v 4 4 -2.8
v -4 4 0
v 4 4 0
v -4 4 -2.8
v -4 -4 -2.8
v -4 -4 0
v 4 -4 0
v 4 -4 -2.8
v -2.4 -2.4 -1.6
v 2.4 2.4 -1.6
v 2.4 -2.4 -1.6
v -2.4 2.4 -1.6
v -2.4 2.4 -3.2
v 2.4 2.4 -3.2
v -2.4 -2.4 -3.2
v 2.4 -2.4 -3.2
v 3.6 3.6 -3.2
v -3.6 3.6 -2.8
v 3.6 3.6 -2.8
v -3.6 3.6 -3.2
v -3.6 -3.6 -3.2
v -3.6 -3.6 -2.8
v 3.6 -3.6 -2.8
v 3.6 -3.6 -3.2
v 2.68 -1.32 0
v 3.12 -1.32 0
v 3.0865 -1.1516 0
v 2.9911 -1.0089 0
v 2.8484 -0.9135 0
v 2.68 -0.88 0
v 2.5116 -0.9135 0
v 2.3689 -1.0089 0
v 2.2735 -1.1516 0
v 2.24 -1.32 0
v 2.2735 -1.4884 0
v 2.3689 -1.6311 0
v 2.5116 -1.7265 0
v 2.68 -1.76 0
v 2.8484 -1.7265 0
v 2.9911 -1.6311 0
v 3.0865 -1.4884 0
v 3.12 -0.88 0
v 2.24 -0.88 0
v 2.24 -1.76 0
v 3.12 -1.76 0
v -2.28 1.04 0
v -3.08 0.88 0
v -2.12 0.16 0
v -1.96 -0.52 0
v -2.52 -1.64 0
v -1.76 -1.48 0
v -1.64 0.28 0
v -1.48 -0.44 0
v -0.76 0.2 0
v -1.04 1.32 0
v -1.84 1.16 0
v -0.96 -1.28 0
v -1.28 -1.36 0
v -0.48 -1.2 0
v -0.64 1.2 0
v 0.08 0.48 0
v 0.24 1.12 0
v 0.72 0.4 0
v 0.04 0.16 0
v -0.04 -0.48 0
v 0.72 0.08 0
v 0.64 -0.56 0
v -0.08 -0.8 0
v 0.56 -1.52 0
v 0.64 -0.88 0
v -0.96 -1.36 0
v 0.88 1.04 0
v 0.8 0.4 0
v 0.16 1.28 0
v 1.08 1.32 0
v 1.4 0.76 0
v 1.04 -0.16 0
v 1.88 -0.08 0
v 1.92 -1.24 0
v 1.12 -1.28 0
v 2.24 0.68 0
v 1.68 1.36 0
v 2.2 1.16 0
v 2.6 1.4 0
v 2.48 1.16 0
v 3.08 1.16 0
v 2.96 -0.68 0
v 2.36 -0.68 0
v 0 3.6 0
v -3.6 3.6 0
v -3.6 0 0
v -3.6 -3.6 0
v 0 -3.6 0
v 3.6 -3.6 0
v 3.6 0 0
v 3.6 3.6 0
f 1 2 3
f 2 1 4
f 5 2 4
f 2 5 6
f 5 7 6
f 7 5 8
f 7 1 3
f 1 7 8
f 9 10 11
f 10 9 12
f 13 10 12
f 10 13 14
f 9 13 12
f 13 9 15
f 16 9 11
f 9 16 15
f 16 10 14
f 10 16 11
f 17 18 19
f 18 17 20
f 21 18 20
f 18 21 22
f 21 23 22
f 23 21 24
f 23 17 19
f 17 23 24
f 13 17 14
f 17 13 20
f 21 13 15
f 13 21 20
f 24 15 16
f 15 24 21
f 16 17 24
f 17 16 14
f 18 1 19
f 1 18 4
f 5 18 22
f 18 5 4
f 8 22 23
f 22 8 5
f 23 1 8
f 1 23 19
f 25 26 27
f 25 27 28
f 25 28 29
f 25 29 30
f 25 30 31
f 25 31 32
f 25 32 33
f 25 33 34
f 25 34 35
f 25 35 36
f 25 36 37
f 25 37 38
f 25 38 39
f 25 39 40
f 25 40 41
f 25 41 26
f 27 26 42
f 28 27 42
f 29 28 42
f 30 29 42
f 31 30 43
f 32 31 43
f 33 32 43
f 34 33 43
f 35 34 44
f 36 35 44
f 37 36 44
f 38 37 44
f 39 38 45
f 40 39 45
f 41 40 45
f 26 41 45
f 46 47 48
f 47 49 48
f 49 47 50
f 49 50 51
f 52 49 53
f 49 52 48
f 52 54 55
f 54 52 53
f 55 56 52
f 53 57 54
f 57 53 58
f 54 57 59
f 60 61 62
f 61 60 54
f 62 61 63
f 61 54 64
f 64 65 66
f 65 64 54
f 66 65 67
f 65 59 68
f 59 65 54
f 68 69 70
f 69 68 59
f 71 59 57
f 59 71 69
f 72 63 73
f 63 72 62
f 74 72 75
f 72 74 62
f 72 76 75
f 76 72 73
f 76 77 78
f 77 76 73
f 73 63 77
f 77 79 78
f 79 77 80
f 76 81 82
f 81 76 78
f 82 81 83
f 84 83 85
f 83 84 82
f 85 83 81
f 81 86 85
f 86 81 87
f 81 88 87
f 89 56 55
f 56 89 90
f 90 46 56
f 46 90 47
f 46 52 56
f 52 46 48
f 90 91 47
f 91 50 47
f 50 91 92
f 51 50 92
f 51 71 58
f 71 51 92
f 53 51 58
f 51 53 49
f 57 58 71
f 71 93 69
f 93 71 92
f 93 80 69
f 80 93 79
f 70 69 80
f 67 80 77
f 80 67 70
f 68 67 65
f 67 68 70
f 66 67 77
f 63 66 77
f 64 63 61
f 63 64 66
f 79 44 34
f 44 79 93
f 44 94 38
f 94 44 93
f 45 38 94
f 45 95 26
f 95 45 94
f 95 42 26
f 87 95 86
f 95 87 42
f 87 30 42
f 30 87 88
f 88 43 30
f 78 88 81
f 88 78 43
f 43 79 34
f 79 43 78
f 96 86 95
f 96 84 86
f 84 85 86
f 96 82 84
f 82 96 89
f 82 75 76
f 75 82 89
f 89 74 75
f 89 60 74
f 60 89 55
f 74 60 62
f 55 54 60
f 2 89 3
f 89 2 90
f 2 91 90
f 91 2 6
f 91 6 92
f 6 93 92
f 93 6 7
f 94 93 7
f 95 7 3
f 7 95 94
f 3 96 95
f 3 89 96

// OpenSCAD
// file: ../p/box5.scad
use <../lib.scad>
function ldraw_lib__box5() = [
// 0 Box with 5 Faces and All Edges
// 0 Name: box5.dat
// 0 Author: James Jessiman
// 0 !LDRAW_ORG Primitive UPDATE 2012-01
// 0 !LICENSE Licensed under CC BY 2.0 and CC BY 4.0 : see CAreadme.txt
// 
// 0 BFC CERTIFY CCW
  [0,"BFC","CERTIFY"],
  [0,"BFC","CCW"],
// 
// 0 !HISTORY 2002-04-03 [sbliss] Modified for BFC compliance
// 0 !HISTORY 2002-04-25 [PTadmin] Official Update 2002-02
// 0 !HISTORY 2007-06-24 [PTadmin] Header formatted for Contributor Agreement
// 0 !HISTORY 2008-07-01 [PTadmin] Official Update 2008-01
// 0 !HISTORY 2012-02-16 [Philo] Changed to CCW
// 0 !HISTORY 2012-03-30 [PTadmin] Official Update 2012-01
// 
// 
// 2 24 1 1 1 -1 1 1
  [2,24,1,1,1,-1,1,1],
// 2 24 -1 1 1 -1 1 -1
  [2,24,-1,1,1,-1,1,-1],
// 2 24 -1 1 -1 1 1 -1
  [2,24,-1,1,-1,1,1,-1],
// 2 24 1 1 -1 1 1 1
  [2,24,1,1,-1,1,1,1],
// 2 24 1 0 1 -1 0 1
  [2,24,1,0,1,-1,0,1],
// 2 24 -1 0 1 -1 0 -1
  [2,24,-1,0,1,-1,0,-1],
// 2 24 -1 0 -1 1 0 -1
  [2,24,-1,0,-1,1,0,-1],
// 2 24 1 0 -1 1 0 1
  [2,24,1,0,-1,1,0,1],
// 2 24 1 0 1 1 1 1
  [2,24,1,0,1,1,1,1],
// 2 24 -1 0 1 -1 1 1
  [2,24,-1,0,1,-1,1,1],
// 2 24 1 0 -1 1 1 -1
  [2,24,1,0,-1,1,1,-1],
// 2 24 -1 0 -1 -1 1 -1
  [2,24,-1,0,-1,-1,1,-1],
// 4 16 -1 1 1 1 1 1 1 1 -1 -1 1 -1
  [4,16,-1,1,1,1,1,1,1,1,-1,-1,1,-1],
// 4 16 -1 1 1 -1 0 1 1 0 1 1 1 1
  [4,16,-1,1,1,-1,0,1,1,0,1,1,1,1],
// 4 16 -1 1 -1 -1 0 -1 -1 0 1 -1 1 1
  [4,16,-1,1,-1,-1,0,-1,-1,0,1,-1,1,1],
// 4 16 1 1 -1 1 0 -1 -1 0 -1 -1 1 -1
  [4,16,1,1,-1,1,0,-1,-1,0,-1,-1,1,-1],
// 4 16 1 1 1 1 0 1 1 0 -1 1 1 -1
  [4,16,1,1,1,1,0,1,1,0,-1,1,1,-1],
];
module ldraw_lib__box5(step=0, col=false, unit=2/5, alt=false, line=0.2, solid=!$preview)
    makepoly(ldraw_lib__box5(), step=step, col=col, unit=unit, alt=alt, line=line, solid=solid);
ldraw_lib__box5(line=0.2);
// file: ../p/box4.scad
use <../lib.scad>
function ldraw_lib__box4() = [
// 0 Box with 4 Faces (2 Parallel Pairs) and All Edges
// 0 Name: box4.dat
// 0 Author: James Jessiman
// 0 !LDRAW_ORG Primitive UPDATE 2012-01
// 0 !LICENSE Licensed under CC BY 2.0 and CC BY 4.0 : see CAreadme.txt
// 
// 0 BFC CERTIFY CCW
  [0,"BFC","CERTIFY"],
  [0,"BFC","CCW"],
// 
// 0 !HISTORY 2002-04-03 [sbliss] Modified for BFC compliance
// 0 !HISTORY 2002-04-25 [PTadmin] Official Update 2002-02
// 0 !HISTORY 2007-06-24 [PTadmin] Header formatted for Contributor Agreement
// 0 !HISTORY 2008-07-01 [PTadmin] Official Update 2008-01
// 0 !HISTORY 2012-02-16 [Philo] Changed to CCW
// 0 !HISTORY 2012-03-30 [PTadmin] Official Update 2012-01
// 
// 
// 2 24 1 1 1 -1 1 1
  [2,24,1,1,1,-1,1,1],
// 2 24 -1 1 1 -1 1 -1
  [2,24,-1,1,1,-1,1,-1],
// 2 24 -1 1 -1 1 1 -1
  [2,24,-1,1,-1,1,1,-1],
// 2 24 1 1 -1 1 1 1
  [2,24,1,1,-1,1,1,1],
// 2 24 1 0 1 -1 0 1
  [2,24,1,0,1,-1,0,1],
// 2 24 -1 0 1 -1 0 -1
  [2,24,-1,0,1,-1,0,-1],
// 2 24 -1 0 -1 1 0 -1
  [2,24,-1,0,-1,1,0,-1],
// 2 24 1 0 -1 1 0 1
  [2,24,1,0,-1,1,0,1],
// 2 24 1 0 1 1 1 1
  [2,24,1,0,1,1,1,1],
// 2 24 -1 0 1 -1 1 1
  [2,24,-1,0,1,-1,1,1],
// 2 24 1 0 -1 1 1 -1
  [2,24,1,0,-1,1,1,-1],
// 2 24 -1 0 -1 -1 1 -1
  [2,24,-1,0,-1,-1,1,-1],
// 4 16 -1 1 1 -1 0 1 1 0 1 1 1 1
  [4,16,-1,1,1,-1,0,1,1,0,1,1,1,1],
// 4 16 -1 1 -1 -1 0 -1 -1 0 1 -1 1 1
  [4,16,-1,1,-1,-1,0,-1,-1,0,1,-1,1,1],
// 4 16 1 1 -1 1 0 -1 -1 0 -1 -1 1 -1
  [4,16,1,1,-1,1,0,-1,-1,0,-1,-1,1,-1],
// 4 16 1 1 1 1 0 1 1 0 -1 1 1 -1
  [4,16,1,1,1,1,0,1,1,0,-1,1,1,-1],
];
module ldraw_lib__box4(step=0, col=false, unit=2/5, alt=false, line=0.2, solid=!$preview)
    makepoly(ldraw_lib__box4(), step=step, col=col, unit=unit, alt=alt, line=line, solid=solid);
ldraw_lib__box4(line=0.2);
// file: s/3070bs01.scad
use <../../lib.scad>
use <../../p/box4.scad>
use <../../p/box5.scad>
function ldraw_lib__s__3070bs01() = [
// 0 ~Tile  1 x  1 with Groove without Top Face
// 0 Name: s\3070bs01.dat
// 0 Author: Chris Dee [cwdee]
// 0 !LDRAW_ORG Subpart UPDATE 2009-02
// 0 !LICENSE Licensed under CC BY 2.0 and CC BY 4.0 : see CAreadme.txt
// 
// 0 BFC CERTIFY CCW
  [0,"BFC","CERTIFY"],
  [0,"BFC","CCW"],
// 
// 0 !HISTORY 2009-09-03 [PTadmin] Official Update 2009-02
// 
// 
// 1 16 0 0 0 10 0 0 0 7 0 0 0 10 box4.dat
  [1,16,0,0,0,10,0,0,0,7,0,0,0,10, ldraw_lib__box4()],
// 0 BFC INVERTNEXT
  [0,"BFC","INVERTNEXT"],
// 1 16 0 8 0 6 0 0 0 -4 0 0 0 6 box5.dat
  [1,16,0,8,0,6,0,0,0,-4,0,0,0,6, ldraw_lib__box5()],
// 1 16 0 7 0 9 0 0 0 1 0 0 0 9 box4.dat
  [1,16,0,7,0,9,0,0,0,1,0,0,0,9, ldraw_lib__box4()],
// 
// 4 16 9 8 9 6 8 6 -6 8 6 -9 8 9
  [4,16,9,8,9,6,8,6,-6,8,6,-9,8,9],
// 4 16 -9 8 9 -6 8 6 -6 8 -6 -9 8 -9
  [4,16,-9,8,9,-6,8,6,-6,8,-6,-9,8,-9],
// 4 16 -9 8 -9 -6 8 -6 6 8 -6 9 8 -9
  [4,16,-9,8,-9,-6,8,-6,6,8,-6,9,8,-9],
// 4 16 9 8 -9 6 8 -6 6 8 6 9 8 9
  [4,16,9,8,-9,6,8,-6,6,8,6,9,8,9],
// 
// 4 16 10 7 10 9 7 9 -9 7 9 -10 7 10
  [4,16,10,7,10,9,7,9,-9,7,9,-10,7,10],
// 4 16 -10 7 10 -9 7 9 -9 7 -9 -10 7 -10
  [4,16,-10,7,10,-9,7,9,-9,7,-9,-10,7,-10],
// 4 16 -10 7 -10 -9 7 -9 9 7 -9 10 7 -10
  [4,16,-10,7,-10,-9,7,-9,9,7,-9,10,7,-10],
// 4 16 10 7 -10 9 7 -9 9 7 9 10 7 10
  [4,16,10,7,-10,9,7,-9,9,7,9,10,7,10],
// 0
];
module ldraw_lib__s__3070bs01(step=0, col=false, unit=2/5, alt=false, line=0.2, solid=!$preview)
    makepoly(ldraw_lib__s__3070bs01(), step=step, col=col, unit=unit, alt=alt, line=line, solid=solid);
ldraw_lib__s__3070bs01(line=0.2);
// file: ../p/4-4ndis.scad
use <../lib.scad>
function ldraw_lib__4_4ndis() = [
// 0 Disc Negative 1.0
// 0 Name: 4-4ndis.dat
// 0 Author: James Jessiman
// 0 !LDRAW_ORG Primitive UPDATE 2012-01
// 0 !LICENSE Licensed under CC BY 2.0 and CC BY 4.0 : see CAreadme.txt
// 
// 0 BFC CERTIFY CCW
  [0,"BFC","CERTIFY"],
  [0,"BFC","CCW"],
// 
// 0 !HISTORY 2002-03-23 [sbliss] Added BFC statement; compacted code
// 0 !HISTORY 2002-04-25 [PTadmin] Official Update 2002-02
// 0 !HISTORY 2007-06-24 [PTadmin] Header formatted for Contributor Agreement
// 0 !HISTORY 2008-07-01 [PTadmin] Official Update 2008-01
// 0 !HISTORY 2012-02-16 [Philo] Changed to CCW
// 0 !HISTORY 2012-03-30 [PTadmin] Official Update 2012-01
// 
// 
// 3 16 0.9239 0 0.3827 1 0 0 1 0 1
  [3,16,0.9239,0,0.3827,1,0,0,1,0,1],
// 3 16 0.7071 0 0.7071 0.9239 0 0.3827 1 0 1
  [3,16,0.7071,0,0.7071,0.9239,0,0.3827,1,0,1],
// 3 16 0.3827 0 0.9239 0.7071 0 0.7071 1 0 1
  [3,16,0.3827,0,0.9239,0.7071,0,0.7071,1,0,1],
// 3 16 0 0 1 0.3827 0 0.9239 1 0 1
  [3,16,0,0,1,0.3827,0,0.9239,1,0,1],
// 3 16 -0.3827 0 0.9239 0 0 1 -1 0 1
  [3,16,-0.3827,0,0.9239,0,0,1,-1,0,1],
// 3 16 -0.7071 0 0.7071 -0.3827 0 0.9239 -1 0 1
  [3,16,-0.7071,0,0.7071,-0.3827,0,0.9239,-1,0,1],
// 3 16 -0.9239 0 0.3827 -0.7071 0 0.7071 -1 0 1
  [3,16,-0.9239,0,0.3827,-0.7071,0,0.7071,-1,0,1],
// 3 16 -1 0 0 -0.9239 0 0.3827 -1 0 1
  [3,16,-1,0,0,-0.9239,0,0.3827,-1,0,1],
// 3 16 -0.9239 0 -0.3827 -1 0 0 -1 0 -1
  [3,16,-0.9239,0,-0.3827,-1,0,0,-1,0,-1],
// 3 16 -0.7071 0 -0.7071 -0.9239 0 -0.3827 -1 0 -1
  [3,16,-0.7071,0,-0.7071,-0.9239,0,-0.3827,-1,0,-1],
// 3 16 -0.3827 0 -0.9239 -0.7071 0 -0.7071 -1 0 -1
  [3,16,-0.3827,0,-0.9239,-0.7071,0,-0.7071,-1,0,-1],
// 3 16 0 0 -1 -0.3827 0 -0.9239 -1 0 -1
  [3,16,0,0,-1,-0.3827,0,-0.9239,-1,0,-1],
// 3 16 0.3827 0 -0.9239 0 0 -1 1 0 -1
  [3,16,0.3827,0,-0.9239,0,0,-1,1,0,-1],
// 3 16 0.7071 0 -0.7071 0.3827 0 -0.9239 1 0 -1
  [3,16,0.7071,0,-0.7071,0.3827,0,-0.9239,1,0,-1],
// 3 16 0.9239 0 -0.3827 0.7071 0 -0.7071 1 0 -1
  [3,16,0.9239,0,-0.3827,0.7071,0,-0.7071,1,0,-1],
// 3 16 1 0 0 0.9239 0 -0.3827 1 0 -1
  [3,16,1,0,0,0.9239,0,-0.3827,1,0,-1],
];
module ldraw_lib__4_4ndis(step=0, col=false, unit=2/5, alt=false, line=0.2, solid=!$preview)
    makepoly(ldraw_lib__4_4ndis(), step=step, col=col, unit=unit, alt=alt, line=line, solid=solid);
ldraw_lib__4_4ndis(line=0.2);
// file: ../p/4-4disc.scad
use <../lib.scad>
function ldraw_lib__4_4disc() = [
// 0 Disc 1.0
// 0 Name: 4-4disc.dat
// 0 Author: James Jessiman
// 0 !LDRAW_ORG Primitive UPDATE 2002-02
// 0 !LICENSE Licensed under CC BY 2.0 and CC BY 4.0 : see CAreadme.txt
// 
// 0 BFC CERTIFY CCW
  [0,"BFC","CERTIFY"],
  [0,"BFC","CCW"],
// 
// 0 !HISTORY 1998-12-15 [PTadmin] Official Update 1998-10
// 0 !HISTORY 2002-03-23 [sbliss] Added BFC statement
// 0 !HISTORY 2002-04-25 [PTadmin] Official Update 2002-02
// 0 !HISTORY 2007-06-24 [PTadmin] Header formatted for Contributor Agreement
// 0 !HISTORY 2008-07-01 [PTadmin] Official Update 2008-01
// 
// 
// 3 16 0 0 0 1 0 0 0.9239 0 0.3827
  [3,16,0,0,0,1,0,0,0.9239,0,0.3827],
// 3 16 0 0 0 0.9239 0 0.3827 0.7071 0 0.7071
  [3,16,0,0,0,0.9239,0,0.3827,0.7071,0,0.7071],
// 3 16 0 0 0 0.7071 0 0.7071 0.3827 0 0.9239
  [3,16,0,0,0,0.7071,0,0.7071,0.3827,0,0.9239],
// 3 16 0 0 0 0.3827 0 0.9239 0 0 1
  [3,16,0,0,0,0.3827,0,0.9239,0,0,1],
// 3 16 0 0 0 0 0 1 -0.3827 0 0.9239
  [3,16,0,0,0,0,0,1,-0.3827,0,0.9239],
// 3 16 0 0 0 -0.3827 0 0.9239 -0.7071 0 0.7071
  [3,16,0,0,0,-0.3827,0,0.9239,-0.7071,0,0.7071],
// 3 16 0 0 0 -0.7071 0 0.7071 -0.9239 0 0.3827
  [3,16,0,0,0,-0.7071,0,0.7071,-0.9239,0,0.3827],
// 3 16 0 0 0 -0.9239 0 0.3827 -1 0 -0
  [3,16,0,0,0,-0.9239,0,0.3827,-1,0,-0],
// 3 16 0 0 0 -1 0 -0 -0.9239 0 -0.3827
  [3,16,0,0,0,-1,0,-0,-0.9239,0,-0.3827],
// 3 16 0 0 0 -0.9239 0 -0.3827 -0.7071 0 -0.7071
  [3,16,0,0,0,-0.9239,0,-0.3827,-0.7071,0,-0.7071],
// 3 16 0 0 0 -0.7071 0 -0.7071 -0.3827 0 -0.9239
  [3,16,0,0,0,-0.7071,0,-0.7071,-0.3827,0,-0.9239],
// 3 16 0 0 0 -0.3827 0 -0.9239 0 0 -1
  [3,16,0,0,0,-0.3827,0,-0.9239,0,0,-1],
// 3 16 0 0 0 0 0 -1 0.3827 0 -0.9239
  [3,16,0,0,0,0,0,-1,0.3827,0,-0.9239],
// 3 16 0 0 0 0.3827 0 -0.9239 0.7071 0 -0.7071
  [3,16,0,0,0,0.3827,0,-0.9239,0.7071,0,-0.7071],
// 3 16 0 0 0 0.7071 0 -0.7071 0.9239 0 -0.3827
  [3,16,0,0,0,0.7071,0,-0.7071,0.9239,0,-0.3827],
// 3 16 0 0 0 0.9239 0 -0.3827 1 0 0
  [3,16,0,0,0,0.9239,0,-0.3827,1,0,0],
// 0
];
module ldraw_lib__4_4disc(step=0, col=false, unit=2/5, alt=false, line=0.2, solid=!$preview)
    makepoly(ldraw_lib__4_4disc(), step=step, col=col, unit=unit, alt=alt, line=line, solid=solid);
ldraw_lib__4_4disc(line=0.2);
// main file
use <../lib.scad>
use <../p/4-4disc.scad>
use <../p/4-4ndis.scad>
use <s/3070bs01.scad>
function ldraw_lib__3070bp15() = [
// 0 Tile  1 x  1 with Bright Pink and Yellow "HEY!" on Blue Background Pattern
// 0 Name: 3070bp15.dat
// 0 Author: Takeshi Takahashi [RainbowDolphin]
// 0 !LDRAW_ORG Part UPDATE 2022-01
// 0 !LICENSE Licensed under CC BY 2.0 and CC BY 4.0 : see CAreadme.txt
// 
// 0 BFC CERTIFY CCW
  [0,"BFC","CERTIFY"],
  [0,"BFC","CCW"],
// 
// 0 !KEYWORDS Bricklink 3070bpb154, Dots, Set 41916
// 
// 0 !HISTORY 2022-01-14 [PTadmin] Official Update 2022-01
// 
// 
// 1 16 0 0 0 1 0 0 0 1 0 0 0 1 s\3070bs01.dat
  [1,16,0,0,0,1,0,0,0,1,0,0,0,1, ldraw_lib__s__3070bs01()],
// 1 29 6.7 0 -3.3 1.1 0 0 0 1 0 0 0 1.1 4-4disc.dat
  [1,29,6.7,0,-3.3,1.1,0,0,0,1,0,0,0,1.1, ldraw_lib__4_4disc()],
// 1 1 6.7 0 -3.3 1.1 0 0 0 1 0 0 0 1.1 4-4ndis.dat
  [1,1,6.7,0,-3.3,1.1,0,0,0,1,0,0,0,1.1, ldraw_lib__4_4ndis()],
// 3 14 -5.7 0 2.6 -7.7 0 2.2 -5.3 0 0.4
  [3,14,-5.7,0,2.6,-7.7,0,2.2,-5.3,0,0.4],
// 4 14 -4.9 0 -1.3 -5.3 0 0.4 -7.7 0 2.2 -6.3 0 -4.1
  [4,14,-4.9,0,-1.3,-5.3,0,0.4,-7.7,0,2.2,-6.3,0,-4.1],
// 3 14 -4.9 0 -1.3 -6.3 0 -4.1 -4.4 0 -3.7
  [3,14,-4.9,0,-1.3,-6.3,0,-4.1,-4.4,0,-3.7],
// 4 14 -4.1 0 0.7 -5.3 0 0.4 -4.9 0 -1.3 -3.7 0 -1.1
  [4,14,-4.1,0,0.7,-5.3,0,0.4,-4.9,0,-1.3,-3.7,0,-1.1],
// 4 14 -4.1 0 0.7 -3.7 0 -1.1 -1.9 0 0.5 -2.6 0 3.3
  [4,14,-4.1,0,0.7,-3.7,0,-1.1,-1.9,0,0.5,-2.6,0,3.3],
// 3 14 -2.6 0 3.3 -4.6 0 2.9 -4.1 0 0.7
  [3,14,-2.6,0,3.3,-4.6,0,2.9,-4.1,0,0.7],
// 4 14 -2.4 0 -3.2 -1.9 0 0.5 -3.7 0 -1.1 -3.2 0 -3.4
  [4,14,-2.4,0,-3.2,-1.9,0,0.5,-3.7,0,-1.1,-3.2,0,-3.4],
// 3 353 -1.9 0 0.5 -2.4 0 -3.2 -1.2 0 -3
  [3,353,-1.9,0,0.5,-2.4,0,-3.2,-1.2,0,-3],
// 4 29 -1.6 0 3 -1.9 0 0.5 0.2 0 1.2 0.6 0 2.8
  [4,29,-1.6,0,3,-1.9,0,0.5,0.2,0,1.2,0.6,0,2.8],
// 3 29 0.6 0 2.8 0.2 0 1.2 1.8 0 1
  [3,29,0.6,0,2.8,0.2,0,1.2,1.8,0,1],
// 3 29 0.2 0 1.2 -1.9 0 0.5 0.1 0 0.4
  [3,29,0.2,0,1.2,-1.9,0,0.5,0.1,0,0.4],
// 4 29 0.1 0 0.4 -1.9 0 0.5 -0.1 0 -1.2 1.8 0 0.2
  [4,29,0.1,0,0.4,-1.9,0,0.5,-0.1,0,-1.2,1.8,0,0.2],
// 3 29 1.8 0 0.2 -0.1 0 -1.2 1.6 0 -1.4
  [3,29,1.8,0,0.2,-0.1,0,-1.2,1.6,0,-1.4],
// 4 29 -0.2 0 -2 -0.1 0 -1.2 -1.9 0 0.5 -1.2 0 -3
  [4,29,-0.2,0,-2,-0.1,0,-1.2,-1.9,0,0.5,-1.2,0,-3],
// 4 29 1.6 0 -2.2 -0.2 0 -2 -1.2 0 -3 1.4 0 -3.8
  [4,29,1.6,0,-2.2,-0.2,0,-2,-1.2,0,-3,1.4,0,-3.8],
// 4 29 1.4 0 -3.8 -1.2 0 -3 -2.4 0 -3.2 -2.4 0 -3.4
  [4,29,1.4,0,-3.8,-1.2,0,-3,-2.4,0,-3.2,-2.4,0,-3.4],
// 4 353 2.2 0 2.6 0.6 0 2.8 1.8 0 1 2 0 1
  [4,353,2.2,0,2.6,0.6,0,2.8,1.8,0,1,2,0,1],
// 4 14 0.4 0 3.2 0.6 0 2.8 2.2 0 2.6 2.7 0 3.3
  [4,14,0.4,0,3.2,0.6,0,2.8,2.2,0,2.6,2.7,0,3.3],
// 4 14 3.5 0 1.9 2.7 0 3.3 2.2 0 2.6 2 0 1
  [4,14,3.5,0,1.9,2.7,0,3.3,2.2,0,2.6,2,0,1],
// 4 14 4.7 0 -0.2 3.5 0 1.9 2 0 1 2.6 0 -0.4
  [4,14,4.7,0,-0.2,3.5,0,1.9,2,0,1,2.6,0,-0.4],
// 3 14 2 0 1 1.8 0 1 2.6 0 -0.4
  [3,14,2,0,1,1.8,0,1,2.6,0,-0.4],
// 4 14 4.7 0 -0.2 2.6 0 -0.4 2.8 0 -3.2 4.8 0 -3.1
  [4,14,4.7,0,-0.2,2.6,0,-0.4,2.8,0,-3.2,4.8,0,-3.1],
// 4 14 3.5 0 1.9 4.7 0 -0.2 5.6 0 1.7 4.2 0 3.4
  [4,14,3.5,0,1.9,4.7,0,-0.2,5.6,0,1.7,4.2,0,3.4],
// 3 14 4.2 0 3.4 5.6 0 1.7 5.5 0 2.9
  [3,14,4.2,0,3.4,5.6,0,1.7,5.5,0,2.9],
// 4 14 6.5 0 3.5 4.2 0 3.4 5.5 0 2.9 6.2 0 2.9
  [4,14,6.5,0,3.5,4.2,0,3.4,5.5,0,2.9,6.2,0,2.9],
// 3 353 6.2 0 2.9 5.5 0 2.9 5.6 0 1.7
  [3,353,6.2,0,2.9,5.5,0,2.9,5.6,0,1.7],
// 4 29 7.7 0 2.9 6.2 0 2.9 5.6 0 1.7 7.4 0 -1.7
  [4,29,7.7,0,2.9,6.2,0,2.9,5.6,0,1.7,7.4,0,-1.7],
// 3 29 5.6 0 1.7 5.9 0 -1.7 7.4 0 -1.7
  [3,29,5.6,0,1.7,5.9,0,-1.7,7.4,0,-1.7],
// 4 1 -2.6 0 3.3 0 0 9 -9 0 9 -4.6 0 2.9
  [4,1,-2.6,0,3.3,0,0,9,-9,0,9,-4.6,0,2.9],
// 4 1 -5.7 0 2.6 -4.6 0 2.9 -9 0 9 -7.7 0 2.2
  [4,1,-5.7,0,2.6,-4.6,0,2.9,-9,0,9,-7.7,0,2.2],
// 4 1 -4.6 0 2.9 -5.7 0 2.6 -5.3 0 0.4 -4.1 0 0.7
  [4,1,-4.6,0,2.9,-5.7,0,2.6,-5.3,0,0.4,-4.1,0,0.7],
// 3 1 -9 0 9 -9 0 0 -7.7 0 2.2
  [3,1,-9,0,9,-9,0,0,-7.7,0,2.2],
// 4 1 -6.3 0 -4.1 -7.7 0 2.2 -9 0 0 -9 0 -9
  [4,1,-6.3,0,-4.1,-7.7,0,2.2,-9,0,0,-9,0,-9],
// 3 1 -4.4 0 -3.7 -6.3 0 -4.1 -9 0 -9
  [3,1,-4.4,0,-3.7,-6.3,0,-4.1,-9,0,-9],
// 4 1 -3.2 0 -3.4 -4.4 0 -3.7 -9 0 -9 -2.4 0 -3.4
  [4,1,-3.2,0,-3.4,-4.4,0,-3.7,-9,0,-9,-2.4,0,-3.4],
// 4 1 -4.9 0 -1.3 -4.4 0 -3.7 -3.2 0 -3.4 -3.7 0 -1.1
  [4,1,-4.9,0,-1.3,-4.4,0,-3.7,-3.2,0,-3.4,-3.7,0,-1.1],
// 3 1 -2.4 0 -3.2 -3.2 0 -3.4 -2.4 0 -3.4
  [3,1,-2.4,0,-3.2,-3.2,0,-3.4,-2.4,0,-3.4],
// 4 1 -2.4 0 -3.4 -9 0 -9 0 0 -9 1.4 0 -3.8
  [4,1,-2.4,0,-3.4,-9,0,-9,0,0,-9,1.4,0,-3.8],
// 4 1 2.8 0 -3.2 1.4 0 -3.8 0 0 -9 4.8 0 -3.1
  [4,1,2.8,0,-3.2,1.4,0,-3.8,0,0,-9,4.8,0,-3.1],
// 3 1 1.6 0 -2.2 1.4 0 -3.8 2.8 0 -3.2
  [3,1,1.6,0,-2.2,1.4,0,-3.8,2.8,0,-3.2],
// 4 1 1.6 0 -1.4 1.6 0 -2.2 2.8 0 -3.2 2.6 0 -0.4
  [4,1,1.6,0,-1.4,1.6,0,-2.2,2.8,0,-3.2,2.6,0,-0.4],
// 4 1 -0.2 0 -2 1.6 0 -2.2 1.6 0 -1.4 -0.1 0 -1.2
  [4,1,-0.2,0,-2,1.6,0,-2.2,1.6,0,-1.4,-0.1,0,-1.2],
// 3 1 1.8 0 0.2 1.6 0 -1.4 2.6 0 -0.4
  [3,1,1.8,0,0.2,1.6,0,-1.4,2.6,0,-0.4],
// 3 1 1.8 0 1 1.8 0 0.2 2.6 0 -0.4
  [3,1,1.8,0,1,1.8,0,0.2,2.6,0,-0.4],
// 4 1 0.1 0 0.4 1.8 0 0.2 1.8 0 1 0.2 0 1.2
  [4,1,0.1,0,0.4,1.8,0,0.2,1.8,0,1,0.2,0,1.2],
// 4 1 4.8 0 -3.1 0 0 -9 5.6 0 -4.4 5.6 0 -3.3
  [4,1,4.8,0,-3.1,0,0,-9,5.6,0,-4.4,5.6,0,-3.3],
// 4 1 5.6 0 -4.4 0 0 -9 9 0 -9 6.7 0 -4.4
  [4,1,5.6,0,-4.4,0,0,-9,9,0,-9,6.7,0,-4.4],
// 3 1 7.8 0 -4.4 6.7 0 -4.4 9 0 -9
  [3,1,7.8,0,-4.4,6.7,0,-4.4,9,0,-9],
// 4 1 7.8 0 -4.4 9 0 -9 9 0 0 7.8 0 -3.3
  [4,1,7.8,0,-4.4,9,0,-9,9,0,0,7.8,0,-3.3],
// 3 1 9 0 0 7.8 0 -2.2 7.8 0 -3.3
  [3,1,9,0,0,7.8,0,-2.2,7.8,0,-3.3],
// 4 1 7.4 0 -1.7 7.8 0 -2.2 9 0 0 7.7 0 2.9
  [4,1,7.4,0,-1.7,7.8,0,-2.2,9,0,0,7.7,0,2.9],
// 4 1 6.7 0 -2.2 7.8 0 -2.2 7.4 0 -1.7 5.9 0 -1.7
  [4,1,6.7,0,-2.2,7.8,0,-2.2,7.4,0,-1.7,5.9,0,-1.7],
// 3 1 5.9 0 -1.7 5.6 0 -2.2 6.7 0 -2.2
  [3,1,5.9,0,-1.7,5.6,0,-2.2,6.7,0,-2.2],
// 4 1 4.7 0 -0.2 5.6 0 -2.2 5.9 0 -1.7 5.6 0 1.7
  [4,1,4.7,0,-0.2,5.6,0,-2.2,5.9,0,-1.7,5.6,0,1.7],
// 4 1 5.6 0 -2.2 4.7 0 -0.2 4.8 0 -3.1 5.6 0 -3.3
  [4,1,5.6,0,-2.2,4.7,0,-0.2,4.8,0,-3.1,5.6,0,-3.3],
// 3 1 9 0 9 7.7 0 2.9 9 0 0
  [3,1,9,0,9,7.7,0,2.9,9,0,0],
// 3 1 9 0 9 6.5 0 3.5 7.7 0 2.9
  [3,1,9,0,9,6.5,0,3.5,7.7,0,2.9],
// 3 1 6.5 0 3.5 6.2 0 2.9 7.7 0 2.9
  [3,1,6.5,0,3.5,6.2,0,2.9,7.7,0,2.9],
// 4 1 4.2 0 3.4 6.5 0 3.5 9 0 9 0 0 9
  [4,1,4.2,0,3.4,6.5,0,3.5,9,0,9,0,0,9],
// 4 1 4.2 0 3.4 0 0 9 2.7 0 3.3 3.5 0 1.9
  [4,1,4.2,0,3.4,0,0,9,2.7,0,3.3,3.5,0,1.9],
// 3 1 0 0 9 0.4 0 3.2 2.7 0 3.3
  [3,1,0,0,9,0.4,0,3.2,2.7,0,3.3],
// 4 1 -1.6 0 3 0.4 0 3.2 0 0 9 -2.6 0 3.3
  [4,1,-1.6,0,3,0.4,0,3.2,0,0,9,-2.6,0,3.3],
// 3 1 0.4 0 3.2 -1.6 0 3 0.6 0 2.8
  [3,1,0.4,0,3.2,-1.6,0,3,0.6,0,2.8],
// 3 1 -2.6 0 3.3 -1.9 0 0.5 -1.6 0 3
  [3,1,-2.6,0,3.3,-1.9,0,0.5,-1.6,0,3],
// 4 16 0 0 9 10 0 10 -10 0 10 -9 0 9
  [4,16,0,0,9,10,0,10,-10,0,10,-9,0,9],
// 4 16 -9 0 0 -9 0 9 -10 0 10 -10 0 -10
  [4,16,-9,0,0,-9,0,9,-10,0,10,-10,0,-10],
// 3 16 -9 0 0 -10 0 -10 -9 0 -9
  [3,16,-9,0,0,-10,0,-10,-9,0,-9],
// 4 16 0 0 -9 -9 0 -9 -10 0 -10 10 0 -10
  [4,16,0,0,-9,-9,0,-9,-10,0,-10,10,0,-10],
// 3 16 9 0 -9 0 0 -9 10 0 -10
  [3,16,9,0,-9,0,0,-9,10,0,-10],
// 4 16 9 0 0 9 0 -9 10 0 -10 10 0 10
  [4,16,9,0,0,9,0,-9,10,0,-10,10,0,10],
// 3 16 10 0 10 9 0 9 9 0 0
  [3,16,10,0,10,9,0,9,9,0,0],
// 3 16 10 0 10 0 0 9 9 0 9
  [3,16,10,0,10,0,0,9,9,0,9],
];
module ldraw_lib__3070bp15(step=0, col=false, unit=2/5, alt=false, line=0.2, solid=!$preview)
    makepoly(ldraw_lib__3070bp15(), step=step, col=col, unit=unit, alt=alt, line=line, solid=solid);
ldraw_lib__3070bp15(line=0.2);
